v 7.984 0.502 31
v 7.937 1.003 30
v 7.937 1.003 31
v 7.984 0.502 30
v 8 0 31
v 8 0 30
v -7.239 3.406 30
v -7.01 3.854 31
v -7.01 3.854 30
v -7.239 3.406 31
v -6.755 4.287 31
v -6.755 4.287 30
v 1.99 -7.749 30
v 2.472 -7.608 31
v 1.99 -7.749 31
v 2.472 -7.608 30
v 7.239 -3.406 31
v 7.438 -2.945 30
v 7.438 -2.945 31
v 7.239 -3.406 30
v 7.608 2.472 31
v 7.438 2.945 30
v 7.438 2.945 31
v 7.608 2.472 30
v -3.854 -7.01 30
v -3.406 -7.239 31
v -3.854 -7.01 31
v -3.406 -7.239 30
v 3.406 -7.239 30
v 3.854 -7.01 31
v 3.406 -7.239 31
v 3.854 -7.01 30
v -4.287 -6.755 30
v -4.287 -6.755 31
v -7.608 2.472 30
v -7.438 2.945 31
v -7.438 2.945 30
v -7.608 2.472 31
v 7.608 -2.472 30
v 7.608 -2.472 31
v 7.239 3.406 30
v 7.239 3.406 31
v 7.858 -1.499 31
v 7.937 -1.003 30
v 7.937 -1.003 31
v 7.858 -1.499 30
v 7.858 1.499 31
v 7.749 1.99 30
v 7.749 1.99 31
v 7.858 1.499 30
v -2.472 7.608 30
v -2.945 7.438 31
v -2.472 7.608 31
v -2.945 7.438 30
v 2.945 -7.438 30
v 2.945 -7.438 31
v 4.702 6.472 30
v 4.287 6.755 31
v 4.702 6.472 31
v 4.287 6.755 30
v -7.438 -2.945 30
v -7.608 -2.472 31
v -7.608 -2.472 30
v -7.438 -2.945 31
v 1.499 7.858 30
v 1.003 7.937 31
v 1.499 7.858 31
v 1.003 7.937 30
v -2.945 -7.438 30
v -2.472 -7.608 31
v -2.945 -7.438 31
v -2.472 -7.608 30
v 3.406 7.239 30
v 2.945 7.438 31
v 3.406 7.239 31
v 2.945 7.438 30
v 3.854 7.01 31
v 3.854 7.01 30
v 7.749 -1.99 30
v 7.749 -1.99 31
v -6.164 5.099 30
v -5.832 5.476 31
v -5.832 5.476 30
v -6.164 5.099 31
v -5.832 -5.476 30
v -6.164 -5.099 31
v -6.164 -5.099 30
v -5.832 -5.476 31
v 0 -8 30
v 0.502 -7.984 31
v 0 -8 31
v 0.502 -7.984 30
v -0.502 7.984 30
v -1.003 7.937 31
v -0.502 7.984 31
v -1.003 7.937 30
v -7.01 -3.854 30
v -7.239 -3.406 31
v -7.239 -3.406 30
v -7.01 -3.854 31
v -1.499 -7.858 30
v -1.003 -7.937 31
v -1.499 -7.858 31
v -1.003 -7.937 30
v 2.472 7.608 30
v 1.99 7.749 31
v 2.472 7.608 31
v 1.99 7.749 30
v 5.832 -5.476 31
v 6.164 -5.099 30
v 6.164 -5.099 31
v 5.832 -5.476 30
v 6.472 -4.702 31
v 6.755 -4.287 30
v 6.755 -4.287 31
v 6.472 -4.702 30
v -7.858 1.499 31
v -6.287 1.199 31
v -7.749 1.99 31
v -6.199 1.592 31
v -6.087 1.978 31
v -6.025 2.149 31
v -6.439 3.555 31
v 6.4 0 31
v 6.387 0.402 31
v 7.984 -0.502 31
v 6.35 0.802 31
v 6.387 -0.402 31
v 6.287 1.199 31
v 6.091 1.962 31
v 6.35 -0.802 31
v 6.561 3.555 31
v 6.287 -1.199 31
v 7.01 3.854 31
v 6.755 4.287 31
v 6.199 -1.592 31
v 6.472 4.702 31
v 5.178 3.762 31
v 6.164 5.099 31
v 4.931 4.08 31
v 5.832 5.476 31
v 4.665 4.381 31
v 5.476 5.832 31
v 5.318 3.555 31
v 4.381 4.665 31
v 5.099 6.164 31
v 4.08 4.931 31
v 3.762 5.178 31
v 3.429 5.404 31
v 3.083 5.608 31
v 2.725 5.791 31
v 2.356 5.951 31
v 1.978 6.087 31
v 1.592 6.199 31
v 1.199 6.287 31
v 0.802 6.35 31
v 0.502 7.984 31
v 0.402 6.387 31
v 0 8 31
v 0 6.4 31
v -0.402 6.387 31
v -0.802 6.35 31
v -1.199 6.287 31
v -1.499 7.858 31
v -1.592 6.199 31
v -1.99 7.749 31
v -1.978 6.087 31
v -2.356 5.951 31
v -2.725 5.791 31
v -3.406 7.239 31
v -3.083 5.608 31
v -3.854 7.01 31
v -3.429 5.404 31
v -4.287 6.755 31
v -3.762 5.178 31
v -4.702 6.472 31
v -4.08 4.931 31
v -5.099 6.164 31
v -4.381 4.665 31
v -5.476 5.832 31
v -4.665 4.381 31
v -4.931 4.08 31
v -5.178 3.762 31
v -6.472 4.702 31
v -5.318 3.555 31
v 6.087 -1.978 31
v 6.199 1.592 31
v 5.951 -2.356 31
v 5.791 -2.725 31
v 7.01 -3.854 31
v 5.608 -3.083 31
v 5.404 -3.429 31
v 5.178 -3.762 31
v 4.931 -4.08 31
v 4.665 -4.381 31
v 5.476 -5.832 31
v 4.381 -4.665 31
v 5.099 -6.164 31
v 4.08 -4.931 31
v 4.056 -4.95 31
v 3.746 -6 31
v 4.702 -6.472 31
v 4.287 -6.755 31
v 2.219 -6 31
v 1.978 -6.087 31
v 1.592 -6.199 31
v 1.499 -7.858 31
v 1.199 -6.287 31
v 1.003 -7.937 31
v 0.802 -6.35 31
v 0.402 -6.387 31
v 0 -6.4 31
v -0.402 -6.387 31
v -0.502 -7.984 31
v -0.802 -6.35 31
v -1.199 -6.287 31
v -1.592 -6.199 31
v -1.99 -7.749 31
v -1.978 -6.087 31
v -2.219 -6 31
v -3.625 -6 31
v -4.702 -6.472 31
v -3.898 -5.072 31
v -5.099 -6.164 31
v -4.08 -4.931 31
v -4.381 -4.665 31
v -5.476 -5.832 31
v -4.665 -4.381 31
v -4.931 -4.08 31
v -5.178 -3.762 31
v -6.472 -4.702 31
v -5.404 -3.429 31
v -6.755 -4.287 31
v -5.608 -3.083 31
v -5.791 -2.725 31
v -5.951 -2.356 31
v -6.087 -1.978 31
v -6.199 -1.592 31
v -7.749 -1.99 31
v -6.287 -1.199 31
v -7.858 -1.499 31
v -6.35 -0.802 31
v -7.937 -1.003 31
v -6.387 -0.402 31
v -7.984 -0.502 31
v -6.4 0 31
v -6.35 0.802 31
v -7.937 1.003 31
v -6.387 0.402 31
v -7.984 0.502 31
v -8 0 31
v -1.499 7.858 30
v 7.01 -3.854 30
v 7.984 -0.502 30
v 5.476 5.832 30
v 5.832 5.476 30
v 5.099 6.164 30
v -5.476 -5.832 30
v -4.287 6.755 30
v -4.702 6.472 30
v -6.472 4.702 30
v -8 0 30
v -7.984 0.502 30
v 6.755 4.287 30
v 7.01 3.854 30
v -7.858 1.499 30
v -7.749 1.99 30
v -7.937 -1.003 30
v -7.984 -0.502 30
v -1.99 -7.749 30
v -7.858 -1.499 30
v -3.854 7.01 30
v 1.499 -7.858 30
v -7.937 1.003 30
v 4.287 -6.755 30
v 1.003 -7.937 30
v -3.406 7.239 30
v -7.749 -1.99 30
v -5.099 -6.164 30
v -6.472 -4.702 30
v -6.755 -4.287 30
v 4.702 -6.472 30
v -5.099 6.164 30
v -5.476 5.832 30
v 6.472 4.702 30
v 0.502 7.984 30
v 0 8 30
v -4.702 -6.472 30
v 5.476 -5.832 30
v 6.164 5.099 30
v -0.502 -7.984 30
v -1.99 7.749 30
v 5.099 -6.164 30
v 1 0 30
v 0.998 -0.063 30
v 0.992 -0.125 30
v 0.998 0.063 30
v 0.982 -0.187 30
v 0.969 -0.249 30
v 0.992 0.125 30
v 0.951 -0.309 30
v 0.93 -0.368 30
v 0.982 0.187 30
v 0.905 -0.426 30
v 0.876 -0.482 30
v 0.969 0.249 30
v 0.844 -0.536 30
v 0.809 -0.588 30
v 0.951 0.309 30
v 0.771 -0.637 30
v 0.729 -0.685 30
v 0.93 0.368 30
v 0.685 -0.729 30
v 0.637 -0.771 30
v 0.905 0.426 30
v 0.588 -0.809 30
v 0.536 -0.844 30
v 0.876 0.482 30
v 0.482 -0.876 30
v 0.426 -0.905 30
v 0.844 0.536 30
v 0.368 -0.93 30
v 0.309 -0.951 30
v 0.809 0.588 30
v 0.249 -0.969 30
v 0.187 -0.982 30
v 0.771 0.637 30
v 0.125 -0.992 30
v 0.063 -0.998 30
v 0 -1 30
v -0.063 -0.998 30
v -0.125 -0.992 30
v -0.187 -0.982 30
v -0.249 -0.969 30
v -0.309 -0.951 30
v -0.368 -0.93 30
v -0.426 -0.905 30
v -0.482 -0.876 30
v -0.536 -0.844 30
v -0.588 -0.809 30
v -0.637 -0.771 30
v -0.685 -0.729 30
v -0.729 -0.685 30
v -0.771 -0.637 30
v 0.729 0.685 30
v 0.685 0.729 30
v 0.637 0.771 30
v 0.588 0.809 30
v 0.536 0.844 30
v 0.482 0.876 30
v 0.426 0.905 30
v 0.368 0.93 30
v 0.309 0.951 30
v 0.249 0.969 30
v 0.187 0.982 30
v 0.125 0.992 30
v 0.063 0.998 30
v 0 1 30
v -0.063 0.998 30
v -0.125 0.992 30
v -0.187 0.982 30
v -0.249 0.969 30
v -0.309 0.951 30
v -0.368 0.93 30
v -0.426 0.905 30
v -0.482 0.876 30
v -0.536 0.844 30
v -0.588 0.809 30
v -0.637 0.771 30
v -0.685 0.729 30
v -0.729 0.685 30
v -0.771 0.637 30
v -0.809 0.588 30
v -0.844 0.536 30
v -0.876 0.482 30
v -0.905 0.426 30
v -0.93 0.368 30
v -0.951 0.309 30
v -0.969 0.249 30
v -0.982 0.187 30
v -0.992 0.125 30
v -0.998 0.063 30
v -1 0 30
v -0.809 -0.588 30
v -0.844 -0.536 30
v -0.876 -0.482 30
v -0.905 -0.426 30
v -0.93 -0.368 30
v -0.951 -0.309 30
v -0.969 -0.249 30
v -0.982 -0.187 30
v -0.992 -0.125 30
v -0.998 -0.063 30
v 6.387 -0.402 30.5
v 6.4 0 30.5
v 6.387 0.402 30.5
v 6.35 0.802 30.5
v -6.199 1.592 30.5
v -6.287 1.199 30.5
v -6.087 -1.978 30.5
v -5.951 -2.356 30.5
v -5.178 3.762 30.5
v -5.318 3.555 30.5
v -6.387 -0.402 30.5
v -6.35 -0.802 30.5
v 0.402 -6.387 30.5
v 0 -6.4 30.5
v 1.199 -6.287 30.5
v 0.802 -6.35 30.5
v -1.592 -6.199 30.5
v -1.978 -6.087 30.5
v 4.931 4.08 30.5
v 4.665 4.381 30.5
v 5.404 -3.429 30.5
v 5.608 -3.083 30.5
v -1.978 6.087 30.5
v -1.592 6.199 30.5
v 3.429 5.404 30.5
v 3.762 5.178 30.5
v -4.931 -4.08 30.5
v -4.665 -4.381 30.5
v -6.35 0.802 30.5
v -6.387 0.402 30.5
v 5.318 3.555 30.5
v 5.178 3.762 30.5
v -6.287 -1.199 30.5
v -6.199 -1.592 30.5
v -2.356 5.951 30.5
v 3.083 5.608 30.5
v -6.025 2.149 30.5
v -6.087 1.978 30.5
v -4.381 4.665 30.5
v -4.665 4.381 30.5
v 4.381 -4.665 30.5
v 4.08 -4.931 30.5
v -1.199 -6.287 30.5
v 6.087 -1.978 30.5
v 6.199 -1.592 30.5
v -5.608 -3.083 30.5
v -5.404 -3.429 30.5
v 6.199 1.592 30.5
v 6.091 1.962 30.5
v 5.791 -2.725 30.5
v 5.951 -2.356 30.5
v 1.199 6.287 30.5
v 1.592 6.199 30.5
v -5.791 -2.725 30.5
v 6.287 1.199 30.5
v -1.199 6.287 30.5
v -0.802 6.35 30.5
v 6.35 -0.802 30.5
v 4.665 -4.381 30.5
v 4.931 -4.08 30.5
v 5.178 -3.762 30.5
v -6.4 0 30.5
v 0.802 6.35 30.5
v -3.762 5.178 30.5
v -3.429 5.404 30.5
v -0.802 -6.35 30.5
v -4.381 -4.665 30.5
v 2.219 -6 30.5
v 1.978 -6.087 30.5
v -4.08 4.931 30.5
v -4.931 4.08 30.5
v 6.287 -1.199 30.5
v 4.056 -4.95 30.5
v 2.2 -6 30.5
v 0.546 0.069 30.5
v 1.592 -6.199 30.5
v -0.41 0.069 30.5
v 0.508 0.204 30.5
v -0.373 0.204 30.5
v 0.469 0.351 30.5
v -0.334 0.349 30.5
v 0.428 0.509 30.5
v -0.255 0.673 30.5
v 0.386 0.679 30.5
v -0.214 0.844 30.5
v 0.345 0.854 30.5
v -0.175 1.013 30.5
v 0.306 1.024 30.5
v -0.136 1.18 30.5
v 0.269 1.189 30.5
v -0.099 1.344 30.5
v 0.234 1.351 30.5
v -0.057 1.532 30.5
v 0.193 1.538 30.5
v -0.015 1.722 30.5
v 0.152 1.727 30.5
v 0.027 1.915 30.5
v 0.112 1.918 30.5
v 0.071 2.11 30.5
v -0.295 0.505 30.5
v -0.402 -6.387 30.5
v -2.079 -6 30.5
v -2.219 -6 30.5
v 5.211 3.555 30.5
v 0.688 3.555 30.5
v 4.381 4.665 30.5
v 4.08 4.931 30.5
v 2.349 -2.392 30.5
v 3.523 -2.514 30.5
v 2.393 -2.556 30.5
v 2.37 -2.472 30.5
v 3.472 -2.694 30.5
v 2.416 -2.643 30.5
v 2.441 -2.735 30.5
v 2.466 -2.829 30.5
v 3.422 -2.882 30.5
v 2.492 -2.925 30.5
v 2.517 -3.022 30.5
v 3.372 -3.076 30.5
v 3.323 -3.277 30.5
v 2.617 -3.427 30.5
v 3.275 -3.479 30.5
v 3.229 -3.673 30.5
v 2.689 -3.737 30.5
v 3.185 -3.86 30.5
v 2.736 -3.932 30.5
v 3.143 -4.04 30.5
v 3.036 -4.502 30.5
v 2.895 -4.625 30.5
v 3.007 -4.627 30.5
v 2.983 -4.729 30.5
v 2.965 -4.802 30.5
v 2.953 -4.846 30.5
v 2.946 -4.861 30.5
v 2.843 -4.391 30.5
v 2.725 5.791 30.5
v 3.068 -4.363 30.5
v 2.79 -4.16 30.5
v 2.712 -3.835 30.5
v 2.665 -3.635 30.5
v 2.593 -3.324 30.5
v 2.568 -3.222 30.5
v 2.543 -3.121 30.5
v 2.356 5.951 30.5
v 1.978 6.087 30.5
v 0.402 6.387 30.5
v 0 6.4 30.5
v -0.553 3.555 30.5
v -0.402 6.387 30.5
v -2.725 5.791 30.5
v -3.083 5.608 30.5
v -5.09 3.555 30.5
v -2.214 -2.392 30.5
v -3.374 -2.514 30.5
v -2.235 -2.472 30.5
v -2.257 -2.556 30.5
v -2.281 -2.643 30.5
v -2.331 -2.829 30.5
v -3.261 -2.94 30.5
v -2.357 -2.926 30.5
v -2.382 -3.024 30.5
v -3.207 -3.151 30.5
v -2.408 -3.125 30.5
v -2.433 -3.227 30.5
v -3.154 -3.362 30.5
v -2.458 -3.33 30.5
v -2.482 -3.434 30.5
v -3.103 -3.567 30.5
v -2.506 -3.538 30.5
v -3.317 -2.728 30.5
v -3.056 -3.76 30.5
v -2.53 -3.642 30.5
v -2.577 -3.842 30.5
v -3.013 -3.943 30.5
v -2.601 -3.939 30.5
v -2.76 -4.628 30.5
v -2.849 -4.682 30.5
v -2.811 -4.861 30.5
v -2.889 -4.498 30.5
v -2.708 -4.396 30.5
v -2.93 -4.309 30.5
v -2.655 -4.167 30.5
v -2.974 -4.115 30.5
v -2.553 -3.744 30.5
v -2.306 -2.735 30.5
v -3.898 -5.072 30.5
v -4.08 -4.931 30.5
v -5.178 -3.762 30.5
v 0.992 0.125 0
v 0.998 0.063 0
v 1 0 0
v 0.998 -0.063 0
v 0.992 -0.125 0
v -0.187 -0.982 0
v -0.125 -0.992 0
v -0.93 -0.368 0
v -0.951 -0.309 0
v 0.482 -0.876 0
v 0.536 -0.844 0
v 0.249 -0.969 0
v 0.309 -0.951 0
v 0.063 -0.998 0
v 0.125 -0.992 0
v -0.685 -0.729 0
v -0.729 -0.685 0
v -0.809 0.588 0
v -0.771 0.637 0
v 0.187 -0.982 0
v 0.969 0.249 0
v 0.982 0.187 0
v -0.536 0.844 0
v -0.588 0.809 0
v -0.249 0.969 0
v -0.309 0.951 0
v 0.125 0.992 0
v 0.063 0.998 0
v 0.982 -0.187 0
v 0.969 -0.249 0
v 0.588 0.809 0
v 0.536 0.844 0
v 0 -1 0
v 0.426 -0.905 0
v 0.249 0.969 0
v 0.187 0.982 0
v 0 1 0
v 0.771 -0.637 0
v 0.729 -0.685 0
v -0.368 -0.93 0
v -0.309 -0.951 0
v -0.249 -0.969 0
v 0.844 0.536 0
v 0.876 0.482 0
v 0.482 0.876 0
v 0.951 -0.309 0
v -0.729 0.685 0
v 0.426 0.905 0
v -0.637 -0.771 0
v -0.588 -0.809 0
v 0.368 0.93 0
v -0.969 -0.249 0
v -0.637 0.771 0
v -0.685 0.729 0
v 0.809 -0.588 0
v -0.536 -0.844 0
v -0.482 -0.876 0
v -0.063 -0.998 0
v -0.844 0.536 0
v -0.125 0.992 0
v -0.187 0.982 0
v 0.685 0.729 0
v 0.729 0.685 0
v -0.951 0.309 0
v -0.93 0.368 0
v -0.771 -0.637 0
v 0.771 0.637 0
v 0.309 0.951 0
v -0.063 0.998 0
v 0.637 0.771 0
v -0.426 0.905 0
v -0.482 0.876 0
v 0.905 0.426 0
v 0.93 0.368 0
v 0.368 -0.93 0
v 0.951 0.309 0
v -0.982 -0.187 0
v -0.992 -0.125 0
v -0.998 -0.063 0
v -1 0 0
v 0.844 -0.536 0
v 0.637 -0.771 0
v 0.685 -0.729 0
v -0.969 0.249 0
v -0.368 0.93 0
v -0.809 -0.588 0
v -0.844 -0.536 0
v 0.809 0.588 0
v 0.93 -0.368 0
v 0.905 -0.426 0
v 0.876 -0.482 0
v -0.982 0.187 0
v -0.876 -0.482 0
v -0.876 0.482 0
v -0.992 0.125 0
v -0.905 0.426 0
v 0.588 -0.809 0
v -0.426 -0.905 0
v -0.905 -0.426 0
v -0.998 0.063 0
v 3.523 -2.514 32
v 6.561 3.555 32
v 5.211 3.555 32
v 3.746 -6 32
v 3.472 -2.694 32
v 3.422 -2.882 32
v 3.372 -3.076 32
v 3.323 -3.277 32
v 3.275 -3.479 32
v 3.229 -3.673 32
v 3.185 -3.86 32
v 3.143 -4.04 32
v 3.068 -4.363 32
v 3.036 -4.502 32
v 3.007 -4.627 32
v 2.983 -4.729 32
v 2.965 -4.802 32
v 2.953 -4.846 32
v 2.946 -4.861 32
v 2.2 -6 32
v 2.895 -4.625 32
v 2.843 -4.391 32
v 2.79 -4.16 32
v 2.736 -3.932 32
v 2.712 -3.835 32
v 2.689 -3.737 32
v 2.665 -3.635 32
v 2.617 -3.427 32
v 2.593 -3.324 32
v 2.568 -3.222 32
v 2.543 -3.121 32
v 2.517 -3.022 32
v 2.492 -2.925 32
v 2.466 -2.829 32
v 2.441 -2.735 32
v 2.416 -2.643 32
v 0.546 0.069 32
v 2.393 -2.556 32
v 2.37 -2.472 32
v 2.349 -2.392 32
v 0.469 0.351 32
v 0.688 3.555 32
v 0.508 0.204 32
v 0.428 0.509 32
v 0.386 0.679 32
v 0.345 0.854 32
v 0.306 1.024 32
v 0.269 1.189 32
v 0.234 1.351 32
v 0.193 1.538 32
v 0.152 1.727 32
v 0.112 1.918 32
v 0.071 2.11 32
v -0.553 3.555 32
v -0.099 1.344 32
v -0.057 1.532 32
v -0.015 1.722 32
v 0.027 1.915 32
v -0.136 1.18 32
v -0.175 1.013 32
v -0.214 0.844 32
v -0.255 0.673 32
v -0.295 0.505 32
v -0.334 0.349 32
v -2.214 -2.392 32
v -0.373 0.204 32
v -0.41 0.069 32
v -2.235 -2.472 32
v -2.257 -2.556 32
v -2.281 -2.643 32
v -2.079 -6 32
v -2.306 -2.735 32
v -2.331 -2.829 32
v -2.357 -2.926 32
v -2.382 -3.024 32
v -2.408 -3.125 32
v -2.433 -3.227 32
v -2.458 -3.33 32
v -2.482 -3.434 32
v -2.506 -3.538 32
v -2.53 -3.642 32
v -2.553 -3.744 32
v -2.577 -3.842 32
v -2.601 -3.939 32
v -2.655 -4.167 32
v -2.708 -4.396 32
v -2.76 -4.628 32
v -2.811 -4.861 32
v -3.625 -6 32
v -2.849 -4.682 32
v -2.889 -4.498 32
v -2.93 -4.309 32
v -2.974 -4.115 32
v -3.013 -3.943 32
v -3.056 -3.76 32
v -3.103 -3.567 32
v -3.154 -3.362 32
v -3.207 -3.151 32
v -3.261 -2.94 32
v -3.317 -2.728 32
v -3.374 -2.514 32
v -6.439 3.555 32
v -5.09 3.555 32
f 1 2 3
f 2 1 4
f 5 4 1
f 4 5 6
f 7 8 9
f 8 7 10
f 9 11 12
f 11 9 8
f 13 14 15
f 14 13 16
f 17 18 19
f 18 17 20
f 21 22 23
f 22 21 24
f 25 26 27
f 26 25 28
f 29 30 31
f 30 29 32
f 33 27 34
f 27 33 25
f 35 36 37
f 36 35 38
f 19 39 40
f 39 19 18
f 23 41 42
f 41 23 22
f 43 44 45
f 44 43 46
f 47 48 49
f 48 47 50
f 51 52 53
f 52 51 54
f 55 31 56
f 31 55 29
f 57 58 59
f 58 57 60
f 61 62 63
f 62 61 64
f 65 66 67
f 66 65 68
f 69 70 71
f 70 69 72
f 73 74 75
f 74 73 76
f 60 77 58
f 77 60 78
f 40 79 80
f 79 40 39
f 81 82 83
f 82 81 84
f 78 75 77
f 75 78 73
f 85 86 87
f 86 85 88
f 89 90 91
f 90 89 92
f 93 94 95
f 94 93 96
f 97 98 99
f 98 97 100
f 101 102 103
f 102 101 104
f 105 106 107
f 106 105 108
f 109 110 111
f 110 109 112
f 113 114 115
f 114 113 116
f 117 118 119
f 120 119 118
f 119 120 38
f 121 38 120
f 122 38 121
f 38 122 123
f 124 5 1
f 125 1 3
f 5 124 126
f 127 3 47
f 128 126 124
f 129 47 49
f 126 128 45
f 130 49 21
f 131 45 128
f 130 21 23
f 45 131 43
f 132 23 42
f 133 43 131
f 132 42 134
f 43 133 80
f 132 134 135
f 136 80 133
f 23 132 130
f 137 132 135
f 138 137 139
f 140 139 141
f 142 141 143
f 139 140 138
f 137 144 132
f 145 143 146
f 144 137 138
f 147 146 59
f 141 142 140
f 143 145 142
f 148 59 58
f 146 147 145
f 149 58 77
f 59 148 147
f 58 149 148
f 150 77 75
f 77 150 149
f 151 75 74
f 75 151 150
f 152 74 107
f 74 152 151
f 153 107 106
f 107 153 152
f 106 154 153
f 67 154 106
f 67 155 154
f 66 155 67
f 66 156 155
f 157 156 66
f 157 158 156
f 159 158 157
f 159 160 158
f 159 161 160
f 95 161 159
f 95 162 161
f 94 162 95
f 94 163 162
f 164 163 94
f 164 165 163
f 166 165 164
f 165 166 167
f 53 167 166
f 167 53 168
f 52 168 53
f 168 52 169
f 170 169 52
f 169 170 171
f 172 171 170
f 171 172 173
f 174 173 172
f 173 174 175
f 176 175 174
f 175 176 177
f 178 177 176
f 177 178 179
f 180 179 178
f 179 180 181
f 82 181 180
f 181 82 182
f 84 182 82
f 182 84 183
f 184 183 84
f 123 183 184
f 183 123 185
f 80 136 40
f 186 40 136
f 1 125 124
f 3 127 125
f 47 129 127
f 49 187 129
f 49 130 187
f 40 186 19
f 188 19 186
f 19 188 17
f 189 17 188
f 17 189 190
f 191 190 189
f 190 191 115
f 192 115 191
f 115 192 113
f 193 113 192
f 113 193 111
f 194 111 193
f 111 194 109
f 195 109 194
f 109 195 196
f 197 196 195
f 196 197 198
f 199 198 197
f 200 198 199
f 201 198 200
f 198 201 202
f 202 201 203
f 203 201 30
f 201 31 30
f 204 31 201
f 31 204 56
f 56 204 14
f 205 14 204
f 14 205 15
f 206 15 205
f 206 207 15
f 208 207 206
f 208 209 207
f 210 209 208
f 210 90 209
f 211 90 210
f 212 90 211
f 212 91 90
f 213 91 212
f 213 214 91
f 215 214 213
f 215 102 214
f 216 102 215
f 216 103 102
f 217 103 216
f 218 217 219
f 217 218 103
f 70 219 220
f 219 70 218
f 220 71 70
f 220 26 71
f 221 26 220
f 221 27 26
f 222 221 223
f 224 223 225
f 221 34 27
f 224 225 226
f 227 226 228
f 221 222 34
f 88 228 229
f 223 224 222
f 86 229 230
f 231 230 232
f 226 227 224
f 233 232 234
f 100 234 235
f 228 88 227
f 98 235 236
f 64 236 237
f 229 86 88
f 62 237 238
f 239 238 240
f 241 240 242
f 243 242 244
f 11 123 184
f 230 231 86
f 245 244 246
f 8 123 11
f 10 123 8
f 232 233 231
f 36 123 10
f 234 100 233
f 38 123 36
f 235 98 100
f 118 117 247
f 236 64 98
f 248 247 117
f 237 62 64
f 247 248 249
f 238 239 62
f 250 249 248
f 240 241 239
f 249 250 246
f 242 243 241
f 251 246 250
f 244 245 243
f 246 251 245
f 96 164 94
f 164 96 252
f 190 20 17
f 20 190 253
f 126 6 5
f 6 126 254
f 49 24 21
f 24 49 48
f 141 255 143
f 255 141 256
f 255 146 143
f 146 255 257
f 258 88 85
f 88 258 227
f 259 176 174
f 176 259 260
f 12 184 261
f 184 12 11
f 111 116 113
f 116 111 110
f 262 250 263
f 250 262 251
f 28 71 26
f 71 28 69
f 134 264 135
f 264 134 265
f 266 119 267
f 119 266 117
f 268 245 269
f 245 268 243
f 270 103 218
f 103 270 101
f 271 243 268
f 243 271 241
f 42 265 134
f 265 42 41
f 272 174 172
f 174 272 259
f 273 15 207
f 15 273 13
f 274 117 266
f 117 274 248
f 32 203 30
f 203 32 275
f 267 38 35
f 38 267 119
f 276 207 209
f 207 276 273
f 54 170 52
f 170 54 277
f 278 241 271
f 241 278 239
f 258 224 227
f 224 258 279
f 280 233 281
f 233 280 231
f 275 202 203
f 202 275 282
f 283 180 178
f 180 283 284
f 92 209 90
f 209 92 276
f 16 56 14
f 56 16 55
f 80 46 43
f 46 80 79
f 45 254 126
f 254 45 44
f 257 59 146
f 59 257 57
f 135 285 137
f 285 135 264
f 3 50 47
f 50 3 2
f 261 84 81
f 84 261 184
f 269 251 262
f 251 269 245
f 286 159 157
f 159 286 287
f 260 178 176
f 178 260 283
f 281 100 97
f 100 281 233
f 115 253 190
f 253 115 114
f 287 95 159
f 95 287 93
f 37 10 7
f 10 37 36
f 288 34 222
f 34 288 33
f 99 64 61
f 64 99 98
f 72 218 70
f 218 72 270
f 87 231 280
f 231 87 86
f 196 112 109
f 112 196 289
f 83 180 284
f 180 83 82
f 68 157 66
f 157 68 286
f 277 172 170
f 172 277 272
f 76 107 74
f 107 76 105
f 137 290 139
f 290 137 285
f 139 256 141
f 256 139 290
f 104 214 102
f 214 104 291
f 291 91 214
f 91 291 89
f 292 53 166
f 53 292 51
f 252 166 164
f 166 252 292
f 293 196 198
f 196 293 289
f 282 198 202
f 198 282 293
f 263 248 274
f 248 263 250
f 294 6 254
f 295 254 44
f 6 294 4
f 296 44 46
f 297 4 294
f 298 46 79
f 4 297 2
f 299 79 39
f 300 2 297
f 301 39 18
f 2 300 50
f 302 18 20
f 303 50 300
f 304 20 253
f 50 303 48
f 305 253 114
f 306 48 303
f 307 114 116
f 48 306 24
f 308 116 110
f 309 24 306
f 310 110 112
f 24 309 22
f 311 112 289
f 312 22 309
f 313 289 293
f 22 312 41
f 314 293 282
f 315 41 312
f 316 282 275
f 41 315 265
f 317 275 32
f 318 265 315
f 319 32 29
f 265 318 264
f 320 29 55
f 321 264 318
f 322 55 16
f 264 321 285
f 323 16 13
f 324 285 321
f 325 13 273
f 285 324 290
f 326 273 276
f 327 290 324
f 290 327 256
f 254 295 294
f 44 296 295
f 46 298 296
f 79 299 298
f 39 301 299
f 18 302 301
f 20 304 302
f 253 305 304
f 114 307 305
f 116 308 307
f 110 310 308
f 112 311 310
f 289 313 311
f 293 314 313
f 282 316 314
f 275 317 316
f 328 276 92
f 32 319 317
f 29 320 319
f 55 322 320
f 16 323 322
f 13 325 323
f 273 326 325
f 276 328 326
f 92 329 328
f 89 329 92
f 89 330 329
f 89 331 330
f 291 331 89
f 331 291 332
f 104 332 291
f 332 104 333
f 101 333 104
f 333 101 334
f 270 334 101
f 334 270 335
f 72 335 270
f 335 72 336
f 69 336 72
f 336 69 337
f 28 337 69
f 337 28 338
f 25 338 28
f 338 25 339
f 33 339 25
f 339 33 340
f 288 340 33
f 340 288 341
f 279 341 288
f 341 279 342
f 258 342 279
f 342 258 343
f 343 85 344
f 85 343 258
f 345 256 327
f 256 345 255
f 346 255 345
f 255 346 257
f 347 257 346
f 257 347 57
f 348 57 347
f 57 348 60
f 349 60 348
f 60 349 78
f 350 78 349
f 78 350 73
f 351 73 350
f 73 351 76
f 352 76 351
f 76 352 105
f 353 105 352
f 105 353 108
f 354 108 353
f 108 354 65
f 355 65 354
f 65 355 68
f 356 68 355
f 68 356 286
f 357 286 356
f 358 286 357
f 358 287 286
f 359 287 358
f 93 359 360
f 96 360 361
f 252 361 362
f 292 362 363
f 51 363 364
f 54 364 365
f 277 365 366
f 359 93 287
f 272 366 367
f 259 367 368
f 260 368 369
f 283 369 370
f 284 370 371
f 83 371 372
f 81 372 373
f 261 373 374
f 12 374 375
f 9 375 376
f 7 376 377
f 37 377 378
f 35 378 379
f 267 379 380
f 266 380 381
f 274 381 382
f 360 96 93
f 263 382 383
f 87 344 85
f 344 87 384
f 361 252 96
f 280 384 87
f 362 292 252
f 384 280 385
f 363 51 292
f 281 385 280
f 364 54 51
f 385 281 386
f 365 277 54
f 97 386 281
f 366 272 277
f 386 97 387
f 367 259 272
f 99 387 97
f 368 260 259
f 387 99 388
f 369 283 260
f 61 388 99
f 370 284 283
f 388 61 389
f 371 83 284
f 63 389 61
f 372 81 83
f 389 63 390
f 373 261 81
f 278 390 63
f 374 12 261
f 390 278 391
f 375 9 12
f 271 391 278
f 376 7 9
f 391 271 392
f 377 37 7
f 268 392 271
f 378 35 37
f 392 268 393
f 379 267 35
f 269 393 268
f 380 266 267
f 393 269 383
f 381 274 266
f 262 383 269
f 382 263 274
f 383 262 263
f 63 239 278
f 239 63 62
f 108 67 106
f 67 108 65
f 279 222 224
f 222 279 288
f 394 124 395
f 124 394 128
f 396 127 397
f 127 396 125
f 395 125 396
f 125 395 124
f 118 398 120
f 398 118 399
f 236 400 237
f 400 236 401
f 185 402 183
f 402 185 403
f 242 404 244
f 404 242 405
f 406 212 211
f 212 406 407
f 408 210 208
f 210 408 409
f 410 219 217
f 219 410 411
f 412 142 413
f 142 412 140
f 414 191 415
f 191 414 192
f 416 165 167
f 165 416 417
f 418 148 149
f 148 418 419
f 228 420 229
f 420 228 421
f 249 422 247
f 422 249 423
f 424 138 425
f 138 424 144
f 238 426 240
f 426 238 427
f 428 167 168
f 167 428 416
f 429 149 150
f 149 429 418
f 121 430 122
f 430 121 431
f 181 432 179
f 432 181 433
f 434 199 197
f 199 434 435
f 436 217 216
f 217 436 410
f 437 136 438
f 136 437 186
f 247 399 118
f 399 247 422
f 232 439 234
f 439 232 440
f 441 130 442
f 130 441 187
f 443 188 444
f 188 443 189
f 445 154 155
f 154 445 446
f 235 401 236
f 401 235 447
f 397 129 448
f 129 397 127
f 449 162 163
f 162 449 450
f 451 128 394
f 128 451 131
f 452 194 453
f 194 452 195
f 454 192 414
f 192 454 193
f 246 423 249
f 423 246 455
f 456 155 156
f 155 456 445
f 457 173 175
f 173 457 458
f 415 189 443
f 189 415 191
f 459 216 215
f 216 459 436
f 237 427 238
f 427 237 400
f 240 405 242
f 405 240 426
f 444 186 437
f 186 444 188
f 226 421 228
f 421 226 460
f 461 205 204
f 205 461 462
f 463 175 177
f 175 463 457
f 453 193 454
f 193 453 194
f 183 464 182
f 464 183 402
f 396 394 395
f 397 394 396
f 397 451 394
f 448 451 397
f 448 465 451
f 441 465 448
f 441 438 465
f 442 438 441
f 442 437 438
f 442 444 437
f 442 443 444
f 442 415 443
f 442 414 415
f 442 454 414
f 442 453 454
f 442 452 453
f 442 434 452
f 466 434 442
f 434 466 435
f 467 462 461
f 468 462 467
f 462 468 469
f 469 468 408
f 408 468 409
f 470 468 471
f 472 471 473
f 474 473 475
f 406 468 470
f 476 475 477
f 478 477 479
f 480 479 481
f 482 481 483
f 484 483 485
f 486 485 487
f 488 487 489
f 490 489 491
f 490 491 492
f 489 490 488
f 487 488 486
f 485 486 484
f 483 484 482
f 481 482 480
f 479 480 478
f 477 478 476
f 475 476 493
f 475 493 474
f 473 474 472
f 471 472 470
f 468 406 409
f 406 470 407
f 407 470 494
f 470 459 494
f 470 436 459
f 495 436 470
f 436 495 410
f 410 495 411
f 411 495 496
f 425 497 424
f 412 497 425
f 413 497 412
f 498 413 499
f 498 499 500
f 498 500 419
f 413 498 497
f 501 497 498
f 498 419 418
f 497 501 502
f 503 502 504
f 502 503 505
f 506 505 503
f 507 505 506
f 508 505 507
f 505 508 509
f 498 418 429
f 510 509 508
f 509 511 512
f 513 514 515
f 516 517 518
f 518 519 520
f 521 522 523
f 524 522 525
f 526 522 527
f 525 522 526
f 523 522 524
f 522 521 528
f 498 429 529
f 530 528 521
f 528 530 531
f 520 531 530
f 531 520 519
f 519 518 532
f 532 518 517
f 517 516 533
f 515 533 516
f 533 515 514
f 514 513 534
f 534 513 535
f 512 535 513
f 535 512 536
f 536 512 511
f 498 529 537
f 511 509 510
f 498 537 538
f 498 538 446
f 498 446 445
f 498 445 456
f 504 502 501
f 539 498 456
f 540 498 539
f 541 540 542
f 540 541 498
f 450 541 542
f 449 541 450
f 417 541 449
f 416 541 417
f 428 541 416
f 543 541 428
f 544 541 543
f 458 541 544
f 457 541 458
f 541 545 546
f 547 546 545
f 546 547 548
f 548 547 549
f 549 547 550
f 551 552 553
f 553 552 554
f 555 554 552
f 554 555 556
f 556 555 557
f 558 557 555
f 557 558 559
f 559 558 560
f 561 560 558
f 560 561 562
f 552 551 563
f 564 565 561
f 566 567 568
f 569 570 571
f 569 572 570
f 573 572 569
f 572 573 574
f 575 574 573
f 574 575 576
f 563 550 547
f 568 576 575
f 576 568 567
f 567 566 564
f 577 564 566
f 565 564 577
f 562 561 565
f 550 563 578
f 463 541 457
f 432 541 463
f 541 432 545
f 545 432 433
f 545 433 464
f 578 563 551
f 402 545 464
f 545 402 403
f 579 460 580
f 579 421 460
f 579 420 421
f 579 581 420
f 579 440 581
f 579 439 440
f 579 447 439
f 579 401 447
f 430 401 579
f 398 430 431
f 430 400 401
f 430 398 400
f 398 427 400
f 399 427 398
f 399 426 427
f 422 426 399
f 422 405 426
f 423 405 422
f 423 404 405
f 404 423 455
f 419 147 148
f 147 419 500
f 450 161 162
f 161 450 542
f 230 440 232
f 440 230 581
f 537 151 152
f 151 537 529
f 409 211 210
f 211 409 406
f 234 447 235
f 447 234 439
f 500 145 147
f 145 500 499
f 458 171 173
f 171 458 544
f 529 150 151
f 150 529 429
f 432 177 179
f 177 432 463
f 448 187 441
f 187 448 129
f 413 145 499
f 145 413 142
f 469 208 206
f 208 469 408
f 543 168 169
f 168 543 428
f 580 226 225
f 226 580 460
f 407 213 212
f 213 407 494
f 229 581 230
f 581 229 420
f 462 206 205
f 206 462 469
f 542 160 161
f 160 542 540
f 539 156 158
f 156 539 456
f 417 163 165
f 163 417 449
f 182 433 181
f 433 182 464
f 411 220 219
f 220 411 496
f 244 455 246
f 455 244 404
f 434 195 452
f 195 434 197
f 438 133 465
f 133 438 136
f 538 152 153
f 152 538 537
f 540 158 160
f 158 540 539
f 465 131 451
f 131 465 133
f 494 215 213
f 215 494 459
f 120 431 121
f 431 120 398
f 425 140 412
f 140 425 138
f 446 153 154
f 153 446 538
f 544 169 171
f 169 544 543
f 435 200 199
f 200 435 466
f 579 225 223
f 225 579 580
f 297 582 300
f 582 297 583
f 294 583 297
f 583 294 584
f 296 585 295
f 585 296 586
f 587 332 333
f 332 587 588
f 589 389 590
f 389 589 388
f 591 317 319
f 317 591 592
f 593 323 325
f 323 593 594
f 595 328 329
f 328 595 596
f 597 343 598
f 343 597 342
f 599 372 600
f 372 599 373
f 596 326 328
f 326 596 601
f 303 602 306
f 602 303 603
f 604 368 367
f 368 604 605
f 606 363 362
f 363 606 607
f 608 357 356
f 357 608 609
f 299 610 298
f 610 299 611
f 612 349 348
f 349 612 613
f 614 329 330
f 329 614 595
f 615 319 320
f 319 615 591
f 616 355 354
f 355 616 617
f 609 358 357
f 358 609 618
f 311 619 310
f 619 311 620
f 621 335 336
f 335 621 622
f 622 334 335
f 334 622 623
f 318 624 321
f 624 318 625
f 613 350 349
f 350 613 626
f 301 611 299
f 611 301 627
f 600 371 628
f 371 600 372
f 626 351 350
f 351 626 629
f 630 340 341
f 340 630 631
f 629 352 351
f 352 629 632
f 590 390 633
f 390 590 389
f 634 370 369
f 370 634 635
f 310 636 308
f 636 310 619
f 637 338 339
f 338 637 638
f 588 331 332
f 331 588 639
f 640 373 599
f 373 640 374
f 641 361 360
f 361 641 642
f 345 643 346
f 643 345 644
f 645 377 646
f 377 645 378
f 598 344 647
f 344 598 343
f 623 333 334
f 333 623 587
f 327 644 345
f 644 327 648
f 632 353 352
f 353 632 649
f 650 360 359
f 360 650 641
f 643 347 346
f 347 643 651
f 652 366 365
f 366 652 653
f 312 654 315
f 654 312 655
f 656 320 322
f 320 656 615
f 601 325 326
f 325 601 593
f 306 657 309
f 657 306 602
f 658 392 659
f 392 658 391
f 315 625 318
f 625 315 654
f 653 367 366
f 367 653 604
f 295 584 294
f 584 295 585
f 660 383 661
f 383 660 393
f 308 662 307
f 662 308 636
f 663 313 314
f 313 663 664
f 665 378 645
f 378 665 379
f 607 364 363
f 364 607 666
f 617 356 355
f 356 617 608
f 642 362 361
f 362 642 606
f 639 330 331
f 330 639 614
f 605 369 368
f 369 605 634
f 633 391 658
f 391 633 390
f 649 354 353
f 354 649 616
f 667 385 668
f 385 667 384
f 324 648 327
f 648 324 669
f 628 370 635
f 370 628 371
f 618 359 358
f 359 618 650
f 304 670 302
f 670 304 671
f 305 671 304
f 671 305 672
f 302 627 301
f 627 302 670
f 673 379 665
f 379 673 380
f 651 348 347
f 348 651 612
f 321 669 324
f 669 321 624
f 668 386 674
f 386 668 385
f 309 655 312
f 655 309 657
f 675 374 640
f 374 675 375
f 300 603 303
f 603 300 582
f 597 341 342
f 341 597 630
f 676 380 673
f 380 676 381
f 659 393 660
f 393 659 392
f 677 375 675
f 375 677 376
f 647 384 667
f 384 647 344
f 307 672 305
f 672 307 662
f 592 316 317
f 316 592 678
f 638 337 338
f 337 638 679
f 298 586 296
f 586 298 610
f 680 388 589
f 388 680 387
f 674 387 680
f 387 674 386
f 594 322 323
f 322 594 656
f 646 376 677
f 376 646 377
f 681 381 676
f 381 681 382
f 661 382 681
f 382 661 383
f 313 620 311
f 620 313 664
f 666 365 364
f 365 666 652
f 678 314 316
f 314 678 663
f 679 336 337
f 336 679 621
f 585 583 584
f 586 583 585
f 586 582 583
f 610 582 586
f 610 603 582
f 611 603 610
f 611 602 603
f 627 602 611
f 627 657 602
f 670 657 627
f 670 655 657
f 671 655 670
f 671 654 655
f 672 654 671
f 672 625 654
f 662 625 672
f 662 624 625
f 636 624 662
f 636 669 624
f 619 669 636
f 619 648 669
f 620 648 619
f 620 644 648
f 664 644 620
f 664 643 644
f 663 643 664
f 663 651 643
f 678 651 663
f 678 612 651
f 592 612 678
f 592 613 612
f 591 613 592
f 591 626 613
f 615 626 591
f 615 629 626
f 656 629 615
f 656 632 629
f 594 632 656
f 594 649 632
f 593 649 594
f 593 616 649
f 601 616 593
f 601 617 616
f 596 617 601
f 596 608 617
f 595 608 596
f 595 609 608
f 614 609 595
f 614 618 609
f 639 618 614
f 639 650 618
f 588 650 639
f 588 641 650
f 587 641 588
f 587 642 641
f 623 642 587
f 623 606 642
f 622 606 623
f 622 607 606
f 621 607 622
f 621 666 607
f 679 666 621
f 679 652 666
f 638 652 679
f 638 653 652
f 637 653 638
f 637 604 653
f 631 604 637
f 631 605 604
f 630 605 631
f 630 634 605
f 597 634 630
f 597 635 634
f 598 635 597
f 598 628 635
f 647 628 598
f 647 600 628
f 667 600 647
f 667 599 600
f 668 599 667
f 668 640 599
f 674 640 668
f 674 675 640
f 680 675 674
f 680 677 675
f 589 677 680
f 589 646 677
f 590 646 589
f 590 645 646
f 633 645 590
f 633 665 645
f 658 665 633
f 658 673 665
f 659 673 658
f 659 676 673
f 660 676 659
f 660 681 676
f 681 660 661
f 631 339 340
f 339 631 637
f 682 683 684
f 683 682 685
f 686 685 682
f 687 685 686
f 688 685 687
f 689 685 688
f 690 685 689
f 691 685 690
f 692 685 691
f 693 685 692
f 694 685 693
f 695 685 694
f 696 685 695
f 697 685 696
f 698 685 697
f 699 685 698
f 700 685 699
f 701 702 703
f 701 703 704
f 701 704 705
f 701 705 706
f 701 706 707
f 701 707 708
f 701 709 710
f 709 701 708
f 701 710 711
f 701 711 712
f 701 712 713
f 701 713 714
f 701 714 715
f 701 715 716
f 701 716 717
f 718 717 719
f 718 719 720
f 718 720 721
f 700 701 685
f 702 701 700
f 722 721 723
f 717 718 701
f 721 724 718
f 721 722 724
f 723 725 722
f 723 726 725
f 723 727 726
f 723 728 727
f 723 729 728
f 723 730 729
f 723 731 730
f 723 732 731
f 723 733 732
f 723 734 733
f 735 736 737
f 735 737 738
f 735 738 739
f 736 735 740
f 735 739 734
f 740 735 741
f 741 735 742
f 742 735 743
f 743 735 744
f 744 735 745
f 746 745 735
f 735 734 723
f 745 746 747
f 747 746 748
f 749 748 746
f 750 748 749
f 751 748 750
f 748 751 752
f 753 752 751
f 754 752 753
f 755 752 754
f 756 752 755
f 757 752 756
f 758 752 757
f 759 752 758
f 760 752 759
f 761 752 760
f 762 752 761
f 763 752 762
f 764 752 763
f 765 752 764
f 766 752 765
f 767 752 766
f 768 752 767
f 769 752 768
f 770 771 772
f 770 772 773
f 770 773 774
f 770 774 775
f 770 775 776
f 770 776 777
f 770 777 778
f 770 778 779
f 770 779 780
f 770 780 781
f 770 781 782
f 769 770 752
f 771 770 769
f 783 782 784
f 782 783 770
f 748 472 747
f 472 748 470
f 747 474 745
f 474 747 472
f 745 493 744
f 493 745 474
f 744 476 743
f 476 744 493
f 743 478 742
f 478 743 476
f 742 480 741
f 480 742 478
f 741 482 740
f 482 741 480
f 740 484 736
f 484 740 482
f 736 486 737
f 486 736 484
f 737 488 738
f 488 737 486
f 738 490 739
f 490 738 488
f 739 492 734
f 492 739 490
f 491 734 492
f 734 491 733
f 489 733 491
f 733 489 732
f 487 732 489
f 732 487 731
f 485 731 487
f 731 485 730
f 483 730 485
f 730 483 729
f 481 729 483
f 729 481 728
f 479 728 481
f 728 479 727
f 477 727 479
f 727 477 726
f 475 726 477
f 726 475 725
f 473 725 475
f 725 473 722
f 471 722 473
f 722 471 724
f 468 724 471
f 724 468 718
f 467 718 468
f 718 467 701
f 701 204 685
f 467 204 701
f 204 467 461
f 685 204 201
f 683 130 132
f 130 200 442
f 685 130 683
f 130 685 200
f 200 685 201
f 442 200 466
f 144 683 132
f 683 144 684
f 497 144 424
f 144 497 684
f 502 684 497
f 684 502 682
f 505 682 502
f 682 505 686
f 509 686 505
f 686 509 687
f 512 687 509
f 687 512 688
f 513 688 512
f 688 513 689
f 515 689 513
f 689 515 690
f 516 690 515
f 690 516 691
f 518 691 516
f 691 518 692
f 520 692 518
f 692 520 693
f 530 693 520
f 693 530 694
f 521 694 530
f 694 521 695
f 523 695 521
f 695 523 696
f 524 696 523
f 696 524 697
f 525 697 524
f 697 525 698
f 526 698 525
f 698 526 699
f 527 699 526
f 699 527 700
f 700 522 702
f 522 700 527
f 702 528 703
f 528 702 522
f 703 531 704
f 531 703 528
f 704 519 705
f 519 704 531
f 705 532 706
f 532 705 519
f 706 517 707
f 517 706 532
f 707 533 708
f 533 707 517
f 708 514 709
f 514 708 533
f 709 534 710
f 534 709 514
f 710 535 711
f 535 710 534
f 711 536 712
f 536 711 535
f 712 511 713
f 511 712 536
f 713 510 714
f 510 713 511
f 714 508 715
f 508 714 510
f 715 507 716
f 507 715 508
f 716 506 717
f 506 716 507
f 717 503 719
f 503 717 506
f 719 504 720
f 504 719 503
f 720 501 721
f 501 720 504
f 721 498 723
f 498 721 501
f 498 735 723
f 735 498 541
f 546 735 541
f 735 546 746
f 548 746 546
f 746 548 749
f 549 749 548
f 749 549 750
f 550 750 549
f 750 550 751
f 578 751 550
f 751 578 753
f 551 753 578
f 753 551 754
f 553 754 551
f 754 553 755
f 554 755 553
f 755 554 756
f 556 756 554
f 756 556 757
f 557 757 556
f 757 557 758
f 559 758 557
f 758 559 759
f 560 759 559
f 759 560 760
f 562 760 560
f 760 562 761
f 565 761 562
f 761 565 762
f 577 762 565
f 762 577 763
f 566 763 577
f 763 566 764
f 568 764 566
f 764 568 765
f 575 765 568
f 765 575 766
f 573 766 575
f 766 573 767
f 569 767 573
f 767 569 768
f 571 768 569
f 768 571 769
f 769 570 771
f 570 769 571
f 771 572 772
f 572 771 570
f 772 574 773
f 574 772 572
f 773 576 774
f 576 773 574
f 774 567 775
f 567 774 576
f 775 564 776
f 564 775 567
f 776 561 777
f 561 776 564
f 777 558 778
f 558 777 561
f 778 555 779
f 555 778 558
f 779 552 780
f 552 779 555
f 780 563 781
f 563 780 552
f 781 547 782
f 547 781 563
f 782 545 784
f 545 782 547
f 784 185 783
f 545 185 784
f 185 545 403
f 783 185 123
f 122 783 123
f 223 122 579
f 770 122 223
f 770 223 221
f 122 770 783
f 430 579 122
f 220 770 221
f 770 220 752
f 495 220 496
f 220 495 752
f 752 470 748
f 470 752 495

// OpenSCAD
//Copyright 2022 Gilgamech Technologies
//Title: Enigma keyboard key
//Made by: Stephen Gillie
//Created on: 3/23/2022
//Updated on: 3/23/2022
//Units: millimeters
//Notes: 

enigmaKey("W",-6.5,-6);
module enigmaKey(letter,x=0,y=-5.5,z=-5){
keyHeight = 30;
keyDia = 8;
    cylinder(h=keyHeight,r=1, $fn=100);
difference(){
translate([0,0,keyHeight]){
    cylinder(h=1,r=keyDia, $fn=100);
}
translate([0,0,keyHeight+.5]){
    cylinder(h=1,r=keyDia*.8, $fn=100);
}}
translate([x,y,keyHeight]){
linear_extrude(2){
 text(letter);
}}}
